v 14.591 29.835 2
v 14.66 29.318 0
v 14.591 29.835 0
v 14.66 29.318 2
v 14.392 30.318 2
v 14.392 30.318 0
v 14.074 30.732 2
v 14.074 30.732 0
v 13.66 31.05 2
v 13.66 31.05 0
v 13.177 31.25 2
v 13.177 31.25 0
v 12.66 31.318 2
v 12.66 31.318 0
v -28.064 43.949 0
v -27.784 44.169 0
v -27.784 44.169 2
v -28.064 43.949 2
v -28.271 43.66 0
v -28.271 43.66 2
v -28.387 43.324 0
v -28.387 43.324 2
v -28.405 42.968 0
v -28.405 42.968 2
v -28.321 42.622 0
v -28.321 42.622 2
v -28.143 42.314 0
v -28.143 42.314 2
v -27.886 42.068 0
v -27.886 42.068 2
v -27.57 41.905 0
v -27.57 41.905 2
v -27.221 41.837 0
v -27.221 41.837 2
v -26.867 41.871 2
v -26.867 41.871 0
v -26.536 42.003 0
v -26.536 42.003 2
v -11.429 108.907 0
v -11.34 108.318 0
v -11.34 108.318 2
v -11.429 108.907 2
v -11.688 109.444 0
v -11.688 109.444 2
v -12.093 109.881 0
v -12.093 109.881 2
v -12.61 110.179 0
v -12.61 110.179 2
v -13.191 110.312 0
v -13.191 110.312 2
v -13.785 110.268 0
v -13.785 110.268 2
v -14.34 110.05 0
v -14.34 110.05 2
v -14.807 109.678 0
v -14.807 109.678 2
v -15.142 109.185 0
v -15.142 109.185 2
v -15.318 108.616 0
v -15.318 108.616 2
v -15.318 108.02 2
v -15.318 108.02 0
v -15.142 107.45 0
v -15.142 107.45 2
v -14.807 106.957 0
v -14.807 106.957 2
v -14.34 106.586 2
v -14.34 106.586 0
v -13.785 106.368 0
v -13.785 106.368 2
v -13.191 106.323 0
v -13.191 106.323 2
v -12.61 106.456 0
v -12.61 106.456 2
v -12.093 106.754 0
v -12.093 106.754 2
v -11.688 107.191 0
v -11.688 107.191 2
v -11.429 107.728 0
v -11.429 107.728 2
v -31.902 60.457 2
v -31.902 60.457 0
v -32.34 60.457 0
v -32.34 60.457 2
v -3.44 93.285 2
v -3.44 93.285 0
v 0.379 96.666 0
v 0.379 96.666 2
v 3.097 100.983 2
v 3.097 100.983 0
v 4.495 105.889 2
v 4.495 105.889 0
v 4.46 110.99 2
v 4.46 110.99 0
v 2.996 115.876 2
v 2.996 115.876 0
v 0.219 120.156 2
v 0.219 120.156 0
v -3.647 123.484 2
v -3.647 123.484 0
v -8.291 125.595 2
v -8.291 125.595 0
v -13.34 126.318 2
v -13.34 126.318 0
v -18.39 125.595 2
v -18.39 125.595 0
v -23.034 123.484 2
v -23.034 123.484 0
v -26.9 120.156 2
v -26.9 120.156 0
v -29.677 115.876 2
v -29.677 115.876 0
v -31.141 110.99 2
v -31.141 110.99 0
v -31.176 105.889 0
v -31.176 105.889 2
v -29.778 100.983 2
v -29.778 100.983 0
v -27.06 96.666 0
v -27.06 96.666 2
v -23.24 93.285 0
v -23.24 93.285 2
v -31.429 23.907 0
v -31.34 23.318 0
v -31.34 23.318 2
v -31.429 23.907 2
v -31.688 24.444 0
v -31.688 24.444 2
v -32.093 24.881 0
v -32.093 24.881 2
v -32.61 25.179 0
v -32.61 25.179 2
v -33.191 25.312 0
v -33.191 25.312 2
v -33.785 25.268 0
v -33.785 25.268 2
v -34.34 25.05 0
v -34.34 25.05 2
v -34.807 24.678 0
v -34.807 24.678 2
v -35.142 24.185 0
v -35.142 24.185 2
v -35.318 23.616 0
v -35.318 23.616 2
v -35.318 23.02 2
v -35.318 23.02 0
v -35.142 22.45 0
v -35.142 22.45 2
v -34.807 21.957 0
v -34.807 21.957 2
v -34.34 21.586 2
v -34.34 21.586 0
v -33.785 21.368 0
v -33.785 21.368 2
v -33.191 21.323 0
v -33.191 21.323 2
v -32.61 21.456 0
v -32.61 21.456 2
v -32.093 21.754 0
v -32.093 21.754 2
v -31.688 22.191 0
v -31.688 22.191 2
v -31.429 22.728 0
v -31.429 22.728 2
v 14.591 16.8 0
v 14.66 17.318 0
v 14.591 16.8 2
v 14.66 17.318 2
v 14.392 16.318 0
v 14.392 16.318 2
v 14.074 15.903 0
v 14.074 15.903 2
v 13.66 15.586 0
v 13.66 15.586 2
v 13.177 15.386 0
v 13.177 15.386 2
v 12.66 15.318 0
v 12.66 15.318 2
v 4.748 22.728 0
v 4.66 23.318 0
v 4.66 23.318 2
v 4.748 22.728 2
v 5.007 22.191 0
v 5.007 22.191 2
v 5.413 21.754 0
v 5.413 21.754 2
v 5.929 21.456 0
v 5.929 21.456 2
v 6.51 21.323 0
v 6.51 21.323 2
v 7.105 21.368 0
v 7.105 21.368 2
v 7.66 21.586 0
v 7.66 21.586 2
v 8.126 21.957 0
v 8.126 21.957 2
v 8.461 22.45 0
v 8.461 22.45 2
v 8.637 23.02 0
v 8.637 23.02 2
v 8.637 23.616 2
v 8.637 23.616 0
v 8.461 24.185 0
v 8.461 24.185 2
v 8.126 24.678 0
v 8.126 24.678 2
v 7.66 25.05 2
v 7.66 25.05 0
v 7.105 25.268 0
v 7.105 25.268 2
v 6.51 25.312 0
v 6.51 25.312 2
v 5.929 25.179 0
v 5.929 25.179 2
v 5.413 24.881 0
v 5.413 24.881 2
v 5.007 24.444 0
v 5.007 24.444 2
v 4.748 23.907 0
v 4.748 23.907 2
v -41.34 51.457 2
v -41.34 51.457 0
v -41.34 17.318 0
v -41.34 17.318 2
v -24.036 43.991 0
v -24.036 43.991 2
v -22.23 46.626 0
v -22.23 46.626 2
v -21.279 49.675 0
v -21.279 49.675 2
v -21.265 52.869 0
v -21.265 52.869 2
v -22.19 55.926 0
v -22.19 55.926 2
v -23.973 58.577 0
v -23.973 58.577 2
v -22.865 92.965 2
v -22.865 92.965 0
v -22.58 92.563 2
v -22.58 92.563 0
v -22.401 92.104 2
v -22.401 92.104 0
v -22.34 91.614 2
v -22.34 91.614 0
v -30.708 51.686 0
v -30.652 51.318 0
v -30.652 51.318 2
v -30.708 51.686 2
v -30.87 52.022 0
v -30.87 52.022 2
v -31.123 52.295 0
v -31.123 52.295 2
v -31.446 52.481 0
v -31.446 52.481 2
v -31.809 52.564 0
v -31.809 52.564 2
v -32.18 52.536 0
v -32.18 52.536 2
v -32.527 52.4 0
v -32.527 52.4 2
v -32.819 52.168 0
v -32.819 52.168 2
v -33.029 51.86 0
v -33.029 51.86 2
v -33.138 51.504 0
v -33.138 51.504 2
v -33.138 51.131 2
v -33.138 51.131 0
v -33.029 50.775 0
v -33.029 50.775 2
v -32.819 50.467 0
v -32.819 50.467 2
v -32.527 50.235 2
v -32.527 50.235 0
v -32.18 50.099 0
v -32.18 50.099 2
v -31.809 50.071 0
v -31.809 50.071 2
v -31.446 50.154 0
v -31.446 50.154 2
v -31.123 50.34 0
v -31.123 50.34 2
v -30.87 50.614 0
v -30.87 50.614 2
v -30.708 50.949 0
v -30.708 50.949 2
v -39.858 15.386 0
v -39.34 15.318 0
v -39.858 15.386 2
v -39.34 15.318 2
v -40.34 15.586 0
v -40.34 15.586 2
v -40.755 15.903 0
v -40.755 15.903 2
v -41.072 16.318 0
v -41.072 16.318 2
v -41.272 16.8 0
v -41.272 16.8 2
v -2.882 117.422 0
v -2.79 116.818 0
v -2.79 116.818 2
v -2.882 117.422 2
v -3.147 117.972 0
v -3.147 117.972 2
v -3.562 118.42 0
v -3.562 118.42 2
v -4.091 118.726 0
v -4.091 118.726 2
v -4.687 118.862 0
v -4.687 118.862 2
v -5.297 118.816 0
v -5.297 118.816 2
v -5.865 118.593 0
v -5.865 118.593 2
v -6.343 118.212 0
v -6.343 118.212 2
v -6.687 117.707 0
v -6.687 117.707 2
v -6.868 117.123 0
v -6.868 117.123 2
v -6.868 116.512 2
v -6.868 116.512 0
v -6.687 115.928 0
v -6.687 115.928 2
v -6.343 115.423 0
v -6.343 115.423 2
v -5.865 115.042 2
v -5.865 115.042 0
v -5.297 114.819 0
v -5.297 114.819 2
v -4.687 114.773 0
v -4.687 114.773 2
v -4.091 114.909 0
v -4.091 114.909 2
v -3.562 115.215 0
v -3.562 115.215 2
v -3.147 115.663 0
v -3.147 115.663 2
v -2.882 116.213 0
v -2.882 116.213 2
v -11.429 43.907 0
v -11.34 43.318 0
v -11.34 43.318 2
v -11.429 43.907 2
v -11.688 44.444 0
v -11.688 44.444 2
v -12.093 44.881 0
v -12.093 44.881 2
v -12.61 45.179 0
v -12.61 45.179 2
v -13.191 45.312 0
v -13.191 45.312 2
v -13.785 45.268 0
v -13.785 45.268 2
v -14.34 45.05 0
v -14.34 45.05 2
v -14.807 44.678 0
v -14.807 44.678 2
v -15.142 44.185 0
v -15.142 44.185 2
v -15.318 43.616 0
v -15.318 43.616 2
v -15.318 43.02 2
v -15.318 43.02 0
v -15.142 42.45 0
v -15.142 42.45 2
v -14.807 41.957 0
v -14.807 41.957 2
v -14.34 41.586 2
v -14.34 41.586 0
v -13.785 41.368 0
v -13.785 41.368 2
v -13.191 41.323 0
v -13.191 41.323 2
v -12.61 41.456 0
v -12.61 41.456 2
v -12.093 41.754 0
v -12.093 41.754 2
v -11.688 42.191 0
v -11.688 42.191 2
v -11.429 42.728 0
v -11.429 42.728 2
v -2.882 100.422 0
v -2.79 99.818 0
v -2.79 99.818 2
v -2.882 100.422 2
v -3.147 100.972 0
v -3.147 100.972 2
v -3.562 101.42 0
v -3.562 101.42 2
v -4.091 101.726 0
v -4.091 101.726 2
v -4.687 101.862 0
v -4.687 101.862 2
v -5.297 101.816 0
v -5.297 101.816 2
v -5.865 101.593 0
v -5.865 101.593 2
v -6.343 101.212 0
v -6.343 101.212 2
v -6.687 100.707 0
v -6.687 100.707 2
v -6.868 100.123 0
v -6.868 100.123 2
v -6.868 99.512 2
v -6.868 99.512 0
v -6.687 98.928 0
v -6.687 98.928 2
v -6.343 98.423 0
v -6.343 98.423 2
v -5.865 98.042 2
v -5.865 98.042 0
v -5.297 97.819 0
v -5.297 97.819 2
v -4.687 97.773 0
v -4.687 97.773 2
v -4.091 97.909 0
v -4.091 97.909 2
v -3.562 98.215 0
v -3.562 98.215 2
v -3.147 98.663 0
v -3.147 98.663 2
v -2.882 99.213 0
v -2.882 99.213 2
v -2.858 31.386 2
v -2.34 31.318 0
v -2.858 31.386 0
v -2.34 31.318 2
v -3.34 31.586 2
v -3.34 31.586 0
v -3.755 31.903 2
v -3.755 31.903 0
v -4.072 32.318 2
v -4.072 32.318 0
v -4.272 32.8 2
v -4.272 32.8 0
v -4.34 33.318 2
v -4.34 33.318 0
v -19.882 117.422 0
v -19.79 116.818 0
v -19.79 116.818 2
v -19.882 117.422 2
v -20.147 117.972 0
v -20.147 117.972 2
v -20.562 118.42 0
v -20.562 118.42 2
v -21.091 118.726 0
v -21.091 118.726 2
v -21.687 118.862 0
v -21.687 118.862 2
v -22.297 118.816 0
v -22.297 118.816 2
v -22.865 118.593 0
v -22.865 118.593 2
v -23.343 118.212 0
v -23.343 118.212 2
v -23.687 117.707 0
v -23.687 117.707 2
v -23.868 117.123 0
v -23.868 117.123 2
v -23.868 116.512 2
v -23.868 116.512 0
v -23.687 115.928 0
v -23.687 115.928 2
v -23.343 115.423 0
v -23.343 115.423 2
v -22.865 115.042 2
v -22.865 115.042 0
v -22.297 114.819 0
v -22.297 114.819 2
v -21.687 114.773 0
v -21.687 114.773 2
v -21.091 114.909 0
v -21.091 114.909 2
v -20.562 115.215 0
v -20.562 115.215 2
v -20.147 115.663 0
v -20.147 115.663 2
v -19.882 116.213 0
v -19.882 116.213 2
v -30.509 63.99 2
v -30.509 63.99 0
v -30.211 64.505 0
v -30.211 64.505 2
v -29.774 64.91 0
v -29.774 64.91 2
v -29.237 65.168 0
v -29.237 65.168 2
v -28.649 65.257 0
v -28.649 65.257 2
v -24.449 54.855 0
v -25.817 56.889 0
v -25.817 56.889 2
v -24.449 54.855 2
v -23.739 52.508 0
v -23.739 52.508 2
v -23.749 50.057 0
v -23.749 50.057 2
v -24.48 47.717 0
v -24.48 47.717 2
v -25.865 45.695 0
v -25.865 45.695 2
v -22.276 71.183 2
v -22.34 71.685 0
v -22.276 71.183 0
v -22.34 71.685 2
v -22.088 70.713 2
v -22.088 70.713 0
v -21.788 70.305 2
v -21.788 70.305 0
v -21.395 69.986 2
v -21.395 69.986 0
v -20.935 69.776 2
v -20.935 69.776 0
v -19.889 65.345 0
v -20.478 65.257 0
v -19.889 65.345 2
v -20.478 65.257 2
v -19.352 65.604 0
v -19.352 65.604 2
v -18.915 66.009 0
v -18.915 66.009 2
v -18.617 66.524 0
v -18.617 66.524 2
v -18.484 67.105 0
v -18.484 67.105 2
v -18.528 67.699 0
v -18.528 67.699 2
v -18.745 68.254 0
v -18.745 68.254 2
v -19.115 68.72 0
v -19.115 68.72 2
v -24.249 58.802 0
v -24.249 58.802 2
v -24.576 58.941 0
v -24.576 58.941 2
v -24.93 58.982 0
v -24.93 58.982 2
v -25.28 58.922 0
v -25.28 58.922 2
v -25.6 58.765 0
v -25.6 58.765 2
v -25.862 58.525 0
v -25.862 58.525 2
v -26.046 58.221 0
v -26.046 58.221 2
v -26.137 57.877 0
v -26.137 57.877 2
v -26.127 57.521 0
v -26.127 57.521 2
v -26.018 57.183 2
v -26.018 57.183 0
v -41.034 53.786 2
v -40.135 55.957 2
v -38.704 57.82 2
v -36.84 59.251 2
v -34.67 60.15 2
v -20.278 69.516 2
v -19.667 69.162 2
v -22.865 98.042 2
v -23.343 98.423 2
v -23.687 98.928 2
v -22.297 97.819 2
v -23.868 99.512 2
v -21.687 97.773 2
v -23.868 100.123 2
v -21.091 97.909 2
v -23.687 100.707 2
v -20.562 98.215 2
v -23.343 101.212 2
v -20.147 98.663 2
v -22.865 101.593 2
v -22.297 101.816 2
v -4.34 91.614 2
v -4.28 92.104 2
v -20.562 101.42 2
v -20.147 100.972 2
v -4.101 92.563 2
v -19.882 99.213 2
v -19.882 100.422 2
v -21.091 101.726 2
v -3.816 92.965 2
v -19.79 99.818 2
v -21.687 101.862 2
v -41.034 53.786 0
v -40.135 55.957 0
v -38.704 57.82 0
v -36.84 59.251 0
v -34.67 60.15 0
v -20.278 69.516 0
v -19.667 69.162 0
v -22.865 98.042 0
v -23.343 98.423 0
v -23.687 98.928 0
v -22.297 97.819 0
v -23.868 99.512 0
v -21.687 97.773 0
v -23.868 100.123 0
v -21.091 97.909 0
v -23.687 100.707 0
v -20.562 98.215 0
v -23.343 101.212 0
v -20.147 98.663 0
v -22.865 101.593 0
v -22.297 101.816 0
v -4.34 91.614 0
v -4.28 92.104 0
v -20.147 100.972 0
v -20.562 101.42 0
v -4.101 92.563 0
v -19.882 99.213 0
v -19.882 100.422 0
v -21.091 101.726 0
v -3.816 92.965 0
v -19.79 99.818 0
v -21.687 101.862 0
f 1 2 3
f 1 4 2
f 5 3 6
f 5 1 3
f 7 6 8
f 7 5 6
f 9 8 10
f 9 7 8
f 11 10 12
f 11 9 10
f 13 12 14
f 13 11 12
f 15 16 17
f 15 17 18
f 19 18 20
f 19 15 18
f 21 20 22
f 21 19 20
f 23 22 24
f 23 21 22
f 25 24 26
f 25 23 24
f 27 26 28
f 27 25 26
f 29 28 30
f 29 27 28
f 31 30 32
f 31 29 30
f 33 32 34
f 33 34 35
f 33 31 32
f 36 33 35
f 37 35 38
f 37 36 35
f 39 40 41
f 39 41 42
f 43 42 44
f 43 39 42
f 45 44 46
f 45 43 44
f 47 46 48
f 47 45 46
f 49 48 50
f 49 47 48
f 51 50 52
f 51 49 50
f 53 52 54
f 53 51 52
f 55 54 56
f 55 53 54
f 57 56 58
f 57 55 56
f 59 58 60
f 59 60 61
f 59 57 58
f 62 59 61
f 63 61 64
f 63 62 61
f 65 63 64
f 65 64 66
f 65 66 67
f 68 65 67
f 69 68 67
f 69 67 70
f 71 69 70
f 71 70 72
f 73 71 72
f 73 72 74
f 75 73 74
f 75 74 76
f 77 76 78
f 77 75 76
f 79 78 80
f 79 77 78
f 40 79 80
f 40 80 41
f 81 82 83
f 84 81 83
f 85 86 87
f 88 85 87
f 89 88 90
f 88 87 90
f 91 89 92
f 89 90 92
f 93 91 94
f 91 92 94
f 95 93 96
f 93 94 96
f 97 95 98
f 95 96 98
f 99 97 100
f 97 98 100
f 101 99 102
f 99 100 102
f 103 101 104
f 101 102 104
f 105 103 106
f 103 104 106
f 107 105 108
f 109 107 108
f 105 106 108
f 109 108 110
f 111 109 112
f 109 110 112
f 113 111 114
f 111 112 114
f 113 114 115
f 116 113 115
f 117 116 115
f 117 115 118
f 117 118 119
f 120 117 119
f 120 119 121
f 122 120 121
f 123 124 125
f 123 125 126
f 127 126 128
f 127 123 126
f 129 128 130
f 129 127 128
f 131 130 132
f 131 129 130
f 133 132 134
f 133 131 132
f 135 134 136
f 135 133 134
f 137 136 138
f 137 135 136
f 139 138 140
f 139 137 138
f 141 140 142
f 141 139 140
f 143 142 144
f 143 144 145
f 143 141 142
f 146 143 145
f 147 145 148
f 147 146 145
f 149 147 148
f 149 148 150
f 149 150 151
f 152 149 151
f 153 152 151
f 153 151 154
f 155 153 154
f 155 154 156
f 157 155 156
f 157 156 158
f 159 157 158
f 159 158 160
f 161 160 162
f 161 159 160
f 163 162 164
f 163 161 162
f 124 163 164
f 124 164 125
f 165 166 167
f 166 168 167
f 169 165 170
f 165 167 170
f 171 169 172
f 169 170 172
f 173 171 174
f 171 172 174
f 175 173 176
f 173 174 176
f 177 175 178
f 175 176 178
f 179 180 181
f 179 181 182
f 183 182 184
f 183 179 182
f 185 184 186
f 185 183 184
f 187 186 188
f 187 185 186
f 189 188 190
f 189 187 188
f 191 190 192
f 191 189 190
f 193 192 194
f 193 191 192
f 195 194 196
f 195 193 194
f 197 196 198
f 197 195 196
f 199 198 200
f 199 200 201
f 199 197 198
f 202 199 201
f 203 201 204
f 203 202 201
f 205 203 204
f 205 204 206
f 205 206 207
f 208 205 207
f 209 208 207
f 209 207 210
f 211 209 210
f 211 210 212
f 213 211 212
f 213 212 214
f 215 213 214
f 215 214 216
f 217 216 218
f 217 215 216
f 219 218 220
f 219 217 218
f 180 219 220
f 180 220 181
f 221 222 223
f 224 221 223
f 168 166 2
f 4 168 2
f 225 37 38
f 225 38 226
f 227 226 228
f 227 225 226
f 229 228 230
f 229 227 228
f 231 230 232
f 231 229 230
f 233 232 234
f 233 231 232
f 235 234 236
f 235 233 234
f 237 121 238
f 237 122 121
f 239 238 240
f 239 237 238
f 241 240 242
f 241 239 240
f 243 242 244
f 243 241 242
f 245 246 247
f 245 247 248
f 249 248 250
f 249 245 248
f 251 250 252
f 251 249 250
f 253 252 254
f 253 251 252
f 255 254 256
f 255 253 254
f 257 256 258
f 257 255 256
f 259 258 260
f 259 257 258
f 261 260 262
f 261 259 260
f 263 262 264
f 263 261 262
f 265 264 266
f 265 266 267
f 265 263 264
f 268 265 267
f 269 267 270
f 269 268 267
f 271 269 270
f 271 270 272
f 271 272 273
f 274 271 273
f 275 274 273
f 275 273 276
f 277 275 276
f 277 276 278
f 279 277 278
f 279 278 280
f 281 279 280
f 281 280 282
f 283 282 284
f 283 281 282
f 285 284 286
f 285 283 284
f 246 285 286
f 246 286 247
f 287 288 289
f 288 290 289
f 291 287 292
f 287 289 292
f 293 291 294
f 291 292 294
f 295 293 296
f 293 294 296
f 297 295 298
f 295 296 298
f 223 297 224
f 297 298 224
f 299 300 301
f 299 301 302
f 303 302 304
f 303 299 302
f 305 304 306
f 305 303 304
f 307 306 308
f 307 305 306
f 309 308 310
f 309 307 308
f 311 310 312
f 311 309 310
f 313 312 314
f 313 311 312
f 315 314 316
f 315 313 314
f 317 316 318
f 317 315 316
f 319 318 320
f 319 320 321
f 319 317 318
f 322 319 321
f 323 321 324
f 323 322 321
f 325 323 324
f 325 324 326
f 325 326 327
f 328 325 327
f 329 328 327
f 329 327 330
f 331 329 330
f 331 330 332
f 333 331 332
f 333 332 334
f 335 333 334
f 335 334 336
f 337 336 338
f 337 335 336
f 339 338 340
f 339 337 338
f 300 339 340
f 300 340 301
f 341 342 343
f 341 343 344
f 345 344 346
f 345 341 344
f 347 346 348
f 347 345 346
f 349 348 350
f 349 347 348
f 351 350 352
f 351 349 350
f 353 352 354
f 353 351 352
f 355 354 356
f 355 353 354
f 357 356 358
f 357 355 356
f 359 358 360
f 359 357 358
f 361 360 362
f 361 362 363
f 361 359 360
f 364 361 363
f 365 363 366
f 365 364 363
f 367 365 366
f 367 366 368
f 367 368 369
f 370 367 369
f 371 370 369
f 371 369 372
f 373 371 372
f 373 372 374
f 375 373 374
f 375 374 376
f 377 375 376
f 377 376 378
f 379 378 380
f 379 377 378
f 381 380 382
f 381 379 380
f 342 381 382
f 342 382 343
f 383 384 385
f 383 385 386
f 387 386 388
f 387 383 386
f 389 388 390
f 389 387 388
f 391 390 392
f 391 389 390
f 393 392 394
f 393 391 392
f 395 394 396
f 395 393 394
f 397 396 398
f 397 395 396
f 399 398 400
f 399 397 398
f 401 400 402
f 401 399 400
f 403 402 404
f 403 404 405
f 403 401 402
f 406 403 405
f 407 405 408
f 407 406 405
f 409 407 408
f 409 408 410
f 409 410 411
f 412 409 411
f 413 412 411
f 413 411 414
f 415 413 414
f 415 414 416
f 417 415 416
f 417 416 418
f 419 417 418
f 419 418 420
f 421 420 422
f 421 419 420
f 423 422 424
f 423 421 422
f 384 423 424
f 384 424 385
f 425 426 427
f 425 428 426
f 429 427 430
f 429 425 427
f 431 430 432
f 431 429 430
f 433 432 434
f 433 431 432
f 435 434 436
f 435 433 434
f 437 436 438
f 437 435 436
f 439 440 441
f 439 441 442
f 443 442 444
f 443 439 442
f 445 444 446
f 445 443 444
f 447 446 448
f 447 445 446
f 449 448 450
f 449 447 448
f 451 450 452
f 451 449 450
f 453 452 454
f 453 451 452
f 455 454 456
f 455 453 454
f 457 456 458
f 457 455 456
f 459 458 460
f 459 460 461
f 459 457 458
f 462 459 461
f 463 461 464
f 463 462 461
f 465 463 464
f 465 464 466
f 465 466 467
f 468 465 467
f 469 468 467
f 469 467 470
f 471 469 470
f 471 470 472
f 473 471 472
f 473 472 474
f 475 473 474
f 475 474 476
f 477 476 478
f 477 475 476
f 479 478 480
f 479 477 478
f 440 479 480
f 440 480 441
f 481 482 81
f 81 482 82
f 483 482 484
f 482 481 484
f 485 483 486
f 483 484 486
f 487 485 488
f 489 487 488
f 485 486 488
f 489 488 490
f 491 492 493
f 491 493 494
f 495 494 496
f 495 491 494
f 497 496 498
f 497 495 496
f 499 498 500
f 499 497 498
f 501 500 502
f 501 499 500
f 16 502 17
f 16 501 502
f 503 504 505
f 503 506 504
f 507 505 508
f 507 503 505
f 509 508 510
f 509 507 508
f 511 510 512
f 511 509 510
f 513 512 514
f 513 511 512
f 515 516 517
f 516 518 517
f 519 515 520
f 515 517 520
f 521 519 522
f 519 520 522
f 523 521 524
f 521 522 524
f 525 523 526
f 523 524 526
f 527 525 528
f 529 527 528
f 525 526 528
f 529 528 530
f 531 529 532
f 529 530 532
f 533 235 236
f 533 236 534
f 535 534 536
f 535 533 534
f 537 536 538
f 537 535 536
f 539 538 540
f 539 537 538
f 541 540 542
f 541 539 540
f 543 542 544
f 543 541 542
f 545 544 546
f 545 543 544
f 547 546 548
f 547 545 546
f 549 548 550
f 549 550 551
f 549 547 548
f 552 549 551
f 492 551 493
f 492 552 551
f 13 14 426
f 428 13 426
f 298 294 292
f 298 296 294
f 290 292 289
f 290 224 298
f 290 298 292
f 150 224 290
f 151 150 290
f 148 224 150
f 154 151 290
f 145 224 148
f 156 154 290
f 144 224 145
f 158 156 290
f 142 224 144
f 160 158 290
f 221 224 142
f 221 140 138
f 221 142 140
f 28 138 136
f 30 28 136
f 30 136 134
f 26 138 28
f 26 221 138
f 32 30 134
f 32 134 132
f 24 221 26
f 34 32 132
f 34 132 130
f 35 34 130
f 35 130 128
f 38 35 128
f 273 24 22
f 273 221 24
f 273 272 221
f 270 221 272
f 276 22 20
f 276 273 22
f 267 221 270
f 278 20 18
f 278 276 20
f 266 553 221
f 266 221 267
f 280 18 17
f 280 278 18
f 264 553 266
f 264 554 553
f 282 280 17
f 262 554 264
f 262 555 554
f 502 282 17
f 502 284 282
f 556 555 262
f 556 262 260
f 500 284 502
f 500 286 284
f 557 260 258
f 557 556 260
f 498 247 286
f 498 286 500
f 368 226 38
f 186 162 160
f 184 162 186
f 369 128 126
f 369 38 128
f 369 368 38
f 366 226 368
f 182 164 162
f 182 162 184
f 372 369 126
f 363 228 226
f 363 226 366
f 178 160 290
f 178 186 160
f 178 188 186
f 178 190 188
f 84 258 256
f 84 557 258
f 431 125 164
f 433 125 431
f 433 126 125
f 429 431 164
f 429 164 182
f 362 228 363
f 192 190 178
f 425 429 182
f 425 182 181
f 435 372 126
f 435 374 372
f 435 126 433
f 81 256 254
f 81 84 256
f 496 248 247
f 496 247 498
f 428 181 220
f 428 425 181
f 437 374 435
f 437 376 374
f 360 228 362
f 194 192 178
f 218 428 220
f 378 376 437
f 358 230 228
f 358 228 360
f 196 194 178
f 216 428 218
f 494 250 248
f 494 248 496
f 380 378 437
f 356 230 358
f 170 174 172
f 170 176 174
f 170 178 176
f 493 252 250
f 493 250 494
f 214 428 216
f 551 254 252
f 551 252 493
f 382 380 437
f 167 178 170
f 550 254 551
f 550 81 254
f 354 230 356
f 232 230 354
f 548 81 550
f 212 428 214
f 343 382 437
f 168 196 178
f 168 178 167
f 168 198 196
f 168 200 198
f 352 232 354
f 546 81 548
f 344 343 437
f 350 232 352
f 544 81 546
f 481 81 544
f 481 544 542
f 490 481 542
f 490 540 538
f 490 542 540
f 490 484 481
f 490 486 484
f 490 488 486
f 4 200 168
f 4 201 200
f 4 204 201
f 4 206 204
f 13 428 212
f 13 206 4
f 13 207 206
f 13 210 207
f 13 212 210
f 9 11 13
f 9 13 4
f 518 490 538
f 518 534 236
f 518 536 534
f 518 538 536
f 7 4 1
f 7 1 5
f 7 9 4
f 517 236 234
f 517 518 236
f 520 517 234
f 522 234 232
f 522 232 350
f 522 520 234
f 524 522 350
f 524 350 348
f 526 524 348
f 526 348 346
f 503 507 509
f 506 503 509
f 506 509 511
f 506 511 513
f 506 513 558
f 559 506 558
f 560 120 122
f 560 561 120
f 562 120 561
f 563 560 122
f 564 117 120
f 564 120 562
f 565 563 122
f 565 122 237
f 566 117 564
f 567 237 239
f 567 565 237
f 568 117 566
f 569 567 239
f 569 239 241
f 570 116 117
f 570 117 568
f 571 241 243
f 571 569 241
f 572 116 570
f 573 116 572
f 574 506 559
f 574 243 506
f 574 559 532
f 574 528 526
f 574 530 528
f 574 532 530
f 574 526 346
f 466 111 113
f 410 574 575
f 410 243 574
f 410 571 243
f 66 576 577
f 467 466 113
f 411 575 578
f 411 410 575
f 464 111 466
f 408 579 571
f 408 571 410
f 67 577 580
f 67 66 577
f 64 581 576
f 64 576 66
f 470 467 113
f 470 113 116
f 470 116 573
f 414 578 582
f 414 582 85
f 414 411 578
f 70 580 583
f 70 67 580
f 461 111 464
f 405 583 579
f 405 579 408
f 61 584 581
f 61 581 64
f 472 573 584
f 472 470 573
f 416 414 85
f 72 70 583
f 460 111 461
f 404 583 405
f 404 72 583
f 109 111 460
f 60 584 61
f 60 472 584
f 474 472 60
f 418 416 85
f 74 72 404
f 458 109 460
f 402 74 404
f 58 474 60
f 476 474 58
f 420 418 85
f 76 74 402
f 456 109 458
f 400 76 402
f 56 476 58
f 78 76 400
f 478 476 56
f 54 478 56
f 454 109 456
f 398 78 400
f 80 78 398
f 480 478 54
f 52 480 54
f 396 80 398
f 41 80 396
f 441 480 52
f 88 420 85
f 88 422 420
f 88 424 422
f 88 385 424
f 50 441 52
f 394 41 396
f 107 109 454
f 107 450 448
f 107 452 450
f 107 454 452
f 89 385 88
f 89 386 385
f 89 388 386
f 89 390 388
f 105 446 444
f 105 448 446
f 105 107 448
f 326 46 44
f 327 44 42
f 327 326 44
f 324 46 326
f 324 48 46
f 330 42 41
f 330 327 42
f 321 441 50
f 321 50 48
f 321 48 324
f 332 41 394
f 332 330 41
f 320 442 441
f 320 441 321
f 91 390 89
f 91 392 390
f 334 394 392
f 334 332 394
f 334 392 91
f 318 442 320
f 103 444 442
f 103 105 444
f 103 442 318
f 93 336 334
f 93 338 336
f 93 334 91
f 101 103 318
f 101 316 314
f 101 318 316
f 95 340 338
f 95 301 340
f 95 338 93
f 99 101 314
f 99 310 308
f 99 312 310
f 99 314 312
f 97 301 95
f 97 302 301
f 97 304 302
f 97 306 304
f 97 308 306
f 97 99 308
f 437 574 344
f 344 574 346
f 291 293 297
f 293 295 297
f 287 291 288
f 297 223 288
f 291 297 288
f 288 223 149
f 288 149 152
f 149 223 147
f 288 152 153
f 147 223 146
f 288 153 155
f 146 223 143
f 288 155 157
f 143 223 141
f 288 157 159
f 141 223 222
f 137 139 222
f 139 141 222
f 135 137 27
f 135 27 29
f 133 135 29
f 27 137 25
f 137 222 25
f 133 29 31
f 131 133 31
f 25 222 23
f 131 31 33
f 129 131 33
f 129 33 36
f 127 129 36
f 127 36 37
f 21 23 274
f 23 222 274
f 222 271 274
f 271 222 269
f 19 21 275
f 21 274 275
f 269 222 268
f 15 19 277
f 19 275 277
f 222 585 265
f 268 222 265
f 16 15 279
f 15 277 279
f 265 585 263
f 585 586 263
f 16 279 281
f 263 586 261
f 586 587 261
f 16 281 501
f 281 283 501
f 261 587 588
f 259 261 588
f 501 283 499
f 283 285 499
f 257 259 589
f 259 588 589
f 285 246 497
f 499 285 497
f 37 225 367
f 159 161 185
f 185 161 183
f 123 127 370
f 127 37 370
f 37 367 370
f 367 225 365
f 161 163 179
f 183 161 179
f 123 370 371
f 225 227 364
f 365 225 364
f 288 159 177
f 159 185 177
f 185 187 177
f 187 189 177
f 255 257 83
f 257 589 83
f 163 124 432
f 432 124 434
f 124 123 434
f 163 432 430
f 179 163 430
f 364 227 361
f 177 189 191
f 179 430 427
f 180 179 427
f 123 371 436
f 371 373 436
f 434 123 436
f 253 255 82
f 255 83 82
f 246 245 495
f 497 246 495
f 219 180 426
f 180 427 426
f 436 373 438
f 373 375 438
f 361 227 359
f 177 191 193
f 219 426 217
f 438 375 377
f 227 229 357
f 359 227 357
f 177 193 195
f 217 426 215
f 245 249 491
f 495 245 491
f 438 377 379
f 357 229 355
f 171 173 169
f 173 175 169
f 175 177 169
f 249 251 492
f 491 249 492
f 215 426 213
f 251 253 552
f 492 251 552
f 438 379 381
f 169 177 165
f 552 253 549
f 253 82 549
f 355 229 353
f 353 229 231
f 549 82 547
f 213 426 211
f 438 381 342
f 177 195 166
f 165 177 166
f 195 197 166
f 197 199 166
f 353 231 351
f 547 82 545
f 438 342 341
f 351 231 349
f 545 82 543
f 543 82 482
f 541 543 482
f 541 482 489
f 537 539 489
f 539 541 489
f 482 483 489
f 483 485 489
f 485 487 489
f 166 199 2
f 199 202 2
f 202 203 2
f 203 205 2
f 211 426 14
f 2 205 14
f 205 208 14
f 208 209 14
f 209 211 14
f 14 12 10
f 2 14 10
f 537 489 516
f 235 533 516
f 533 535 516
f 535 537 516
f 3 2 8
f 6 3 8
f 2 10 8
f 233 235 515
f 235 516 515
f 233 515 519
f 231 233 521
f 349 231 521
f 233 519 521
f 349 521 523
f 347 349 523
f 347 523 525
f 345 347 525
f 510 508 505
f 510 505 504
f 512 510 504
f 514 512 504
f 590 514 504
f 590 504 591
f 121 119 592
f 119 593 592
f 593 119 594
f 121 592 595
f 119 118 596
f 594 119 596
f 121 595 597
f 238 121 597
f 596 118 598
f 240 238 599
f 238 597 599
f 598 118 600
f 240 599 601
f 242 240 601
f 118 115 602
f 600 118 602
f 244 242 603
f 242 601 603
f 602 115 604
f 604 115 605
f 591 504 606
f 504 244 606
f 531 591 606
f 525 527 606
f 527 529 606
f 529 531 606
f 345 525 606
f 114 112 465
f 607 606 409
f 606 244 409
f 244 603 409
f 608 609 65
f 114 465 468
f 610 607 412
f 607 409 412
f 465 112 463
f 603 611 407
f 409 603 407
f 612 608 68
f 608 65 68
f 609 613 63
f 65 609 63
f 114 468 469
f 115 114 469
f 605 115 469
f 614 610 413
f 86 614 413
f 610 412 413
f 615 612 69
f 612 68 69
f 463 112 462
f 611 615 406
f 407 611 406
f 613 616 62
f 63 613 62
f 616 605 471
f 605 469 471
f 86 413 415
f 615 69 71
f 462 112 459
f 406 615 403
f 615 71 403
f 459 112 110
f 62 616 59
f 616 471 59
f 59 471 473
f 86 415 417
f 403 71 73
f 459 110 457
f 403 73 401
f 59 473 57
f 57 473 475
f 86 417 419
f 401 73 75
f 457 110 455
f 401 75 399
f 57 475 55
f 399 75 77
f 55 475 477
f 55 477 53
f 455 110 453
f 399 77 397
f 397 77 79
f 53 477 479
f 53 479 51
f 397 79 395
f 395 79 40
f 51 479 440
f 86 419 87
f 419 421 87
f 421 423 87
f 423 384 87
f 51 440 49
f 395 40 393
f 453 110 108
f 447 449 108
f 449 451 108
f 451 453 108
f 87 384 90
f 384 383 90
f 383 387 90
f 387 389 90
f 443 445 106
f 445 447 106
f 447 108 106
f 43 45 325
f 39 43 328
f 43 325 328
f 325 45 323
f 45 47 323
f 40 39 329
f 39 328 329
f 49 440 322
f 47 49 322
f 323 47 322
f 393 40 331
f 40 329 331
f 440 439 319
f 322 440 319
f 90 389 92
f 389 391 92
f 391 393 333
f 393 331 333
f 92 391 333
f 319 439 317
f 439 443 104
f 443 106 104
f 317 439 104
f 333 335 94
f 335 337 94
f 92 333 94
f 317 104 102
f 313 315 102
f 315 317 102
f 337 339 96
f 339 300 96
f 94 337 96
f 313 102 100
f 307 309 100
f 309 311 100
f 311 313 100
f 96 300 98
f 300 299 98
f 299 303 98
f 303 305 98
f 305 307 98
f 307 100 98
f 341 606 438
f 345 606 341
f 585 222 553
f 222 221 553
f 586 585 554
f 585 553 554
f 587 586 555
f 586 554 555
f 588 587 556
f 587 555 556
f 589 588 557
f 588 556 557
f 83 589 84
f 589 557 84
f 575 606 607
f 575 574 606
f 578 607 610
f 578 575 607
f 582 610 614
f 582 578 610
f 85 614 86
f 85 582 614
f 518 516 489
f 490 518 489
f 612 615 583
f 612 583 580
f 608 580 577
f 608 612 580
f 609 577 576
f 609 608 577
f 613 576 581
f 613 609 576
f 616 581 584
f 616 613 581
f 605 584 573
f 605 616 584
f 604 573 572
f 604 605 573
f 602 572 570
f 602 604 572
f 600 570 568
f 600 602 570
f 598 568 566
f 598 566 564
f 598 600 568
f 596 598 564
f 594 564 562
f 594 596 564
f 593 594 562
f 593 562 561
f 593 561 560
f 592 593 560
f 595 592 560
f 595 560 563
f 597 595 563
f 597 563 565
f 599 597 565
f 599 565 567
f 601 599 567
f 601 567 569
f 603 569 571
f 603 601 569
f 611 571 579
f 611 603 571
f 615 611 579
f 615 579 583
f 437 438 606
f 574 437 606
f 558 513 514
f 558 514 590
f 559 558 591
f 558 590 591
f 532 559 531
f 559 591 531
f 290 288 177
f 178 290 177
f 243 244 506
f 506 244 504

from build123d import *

# Parameters (mm, degrees)
SKETCH_1_R      = 2
SKETCH_1_R_2    = 2.05
SKETCH_1_R_3    = 1.25
EXTRUDE_1_DEPTH = 2
FILLET_1_R      = 2
FILLET_3_R      = 9


with BuildPart() as part:
    # 草图1 → 凸台-拉伸1 (new body)
    with BuildSketch(Plane.XY):
        with BuildLine():
            Line((14.659550972, 15.317683161), (14.659550972, 31.317683161))
            Line((14.659550972, 31.317683161), (-4.340449028, 31.317683161))
            Line((-4.340449028, 31.317683161), (-4.340449028, 92.729225893))
            ThreePointArc((-4.340449028, 92.729225893), (-13.340449028, 126.317683161), (-22.340449028, 92.729225893))
            Line((-22.340449028, 92.729225893), (-22.340449028, 69.989347616))
            ThreePointArc((-22.340449028, 69.989347616), (-18.993837092, 68.603135564), (-17.60762504, 65.256523627))
            Line((-17.60762504, 65.256523627), (-30.009910092, 65.256523627))
            Line((-30.009910092, 65.256523627), (-31.902307309, 60.456523627))
            Line((-31.902307309, 60.456523627), (-41.340449028, 60.456523627))
            Line((-41.340449028, 60.456523627), (-41.340449028, 31.317683161))
            Line((-41.340449028, 31.317683161), (-41.340449028, 15.317683161))
            Line((-41.340449028, 15.317683161), (14.659550972, 15.317683161))
        make_face()
        with Locations((-33.340449028, 23.317683161)):
            Circle(SKETCH_1_R, mode=Mode.SUBTRACT)
        with Locations(Location((6.659550972, 23.317683161, 0), (0, 0, 180))):
            Circle(SKETCH_1_R, mode=Mode.SUBTRACT)
        with Locations((-13.340449028, 108.317683161)):
            Circle(SKETCH_1_R, mode=Mode.SUBTRACT)
        with Locations((-13.340449028, 43.317683161)):
            Circle(SKETCH_1_R, mode=Mode.SUBTRACT)
        with Locations((-4.840449028, 116.817683161)):
            Circle(SKETCH_1_R_2, mode=Mode.SUBTRACT)
        with Locations((-31.902307309, 51.317683161)):
            Circle(SKETCH_1_R_3, mode=Mode.SUBTRACT)
        with Locations((-4.840449028, 99.817683161)):
            Circle(SKETCH_1_R_2, mode=Mode.SUBTRACT)
        with Locations((-21.840449028, 99.817683161)):
            Circle(SKETCH_1_R_2, mode=Mode.SUBTRACT)
        with Locations((-21.840449028, 116.817683161)):
            Circle(SKETCH_1_R_2, mode=Mode.SUBTRACT)
        with BuildLine():
            ThreePointArc((-26.536162252, 42.002803279), (-21.278560655, 49.674969847), (-23.973383464, 58.576792381))
            ThreePointArc((-23.973383464, 58.576792381), (-25.73943382, 58.654677802), (-25.817319241, 56.888627446))
            ThreePointArc((-25.817319241, 56.888627446), (-23.749199411, 50.056996199), (-27.784102963, 44.169054414))
            ThreePointArc((-27.784102963, 44.169054414), (-28.243258175, 42.461958491), (-26.536162252, 42.002803279))
        make_face(mode=Mode.SUBTRACT)
    extrude(amount=EXTRUDE_1_DEPTH)

    # 圆角1
    fillet_1_edges = [part.edges().sort_by_distance(p)[0] for p in [
        (-41.340449028, 15.317683161, 1),
        (-30.009910092, 65.256523627, 1),
        (-17.60762504, 65.256523627, 1),
        (-22.340449028, 69.989347616, 1),
        (-22.340449028, 92.729225893, 1),
        (-4.340449028, 92.729225893, 1),
        (-4.340449028, 31.317683161, 1),
        (14.659550972, 31.317683161, 1),
        (14.659550972, 15.317683161, 1),
    ]]
    fillet(fillet_1_edges, radius=FILLET_1_R)

    # 圆角3
    fillet_3_edges = [part.edges().sort_by_distance(p)[0] for p in [
        (-41.340449028, 60.456523627, 1),
    ]]
    fillet(fillet_3_edges, radius=FILLET_3_R)


solid = part.part
